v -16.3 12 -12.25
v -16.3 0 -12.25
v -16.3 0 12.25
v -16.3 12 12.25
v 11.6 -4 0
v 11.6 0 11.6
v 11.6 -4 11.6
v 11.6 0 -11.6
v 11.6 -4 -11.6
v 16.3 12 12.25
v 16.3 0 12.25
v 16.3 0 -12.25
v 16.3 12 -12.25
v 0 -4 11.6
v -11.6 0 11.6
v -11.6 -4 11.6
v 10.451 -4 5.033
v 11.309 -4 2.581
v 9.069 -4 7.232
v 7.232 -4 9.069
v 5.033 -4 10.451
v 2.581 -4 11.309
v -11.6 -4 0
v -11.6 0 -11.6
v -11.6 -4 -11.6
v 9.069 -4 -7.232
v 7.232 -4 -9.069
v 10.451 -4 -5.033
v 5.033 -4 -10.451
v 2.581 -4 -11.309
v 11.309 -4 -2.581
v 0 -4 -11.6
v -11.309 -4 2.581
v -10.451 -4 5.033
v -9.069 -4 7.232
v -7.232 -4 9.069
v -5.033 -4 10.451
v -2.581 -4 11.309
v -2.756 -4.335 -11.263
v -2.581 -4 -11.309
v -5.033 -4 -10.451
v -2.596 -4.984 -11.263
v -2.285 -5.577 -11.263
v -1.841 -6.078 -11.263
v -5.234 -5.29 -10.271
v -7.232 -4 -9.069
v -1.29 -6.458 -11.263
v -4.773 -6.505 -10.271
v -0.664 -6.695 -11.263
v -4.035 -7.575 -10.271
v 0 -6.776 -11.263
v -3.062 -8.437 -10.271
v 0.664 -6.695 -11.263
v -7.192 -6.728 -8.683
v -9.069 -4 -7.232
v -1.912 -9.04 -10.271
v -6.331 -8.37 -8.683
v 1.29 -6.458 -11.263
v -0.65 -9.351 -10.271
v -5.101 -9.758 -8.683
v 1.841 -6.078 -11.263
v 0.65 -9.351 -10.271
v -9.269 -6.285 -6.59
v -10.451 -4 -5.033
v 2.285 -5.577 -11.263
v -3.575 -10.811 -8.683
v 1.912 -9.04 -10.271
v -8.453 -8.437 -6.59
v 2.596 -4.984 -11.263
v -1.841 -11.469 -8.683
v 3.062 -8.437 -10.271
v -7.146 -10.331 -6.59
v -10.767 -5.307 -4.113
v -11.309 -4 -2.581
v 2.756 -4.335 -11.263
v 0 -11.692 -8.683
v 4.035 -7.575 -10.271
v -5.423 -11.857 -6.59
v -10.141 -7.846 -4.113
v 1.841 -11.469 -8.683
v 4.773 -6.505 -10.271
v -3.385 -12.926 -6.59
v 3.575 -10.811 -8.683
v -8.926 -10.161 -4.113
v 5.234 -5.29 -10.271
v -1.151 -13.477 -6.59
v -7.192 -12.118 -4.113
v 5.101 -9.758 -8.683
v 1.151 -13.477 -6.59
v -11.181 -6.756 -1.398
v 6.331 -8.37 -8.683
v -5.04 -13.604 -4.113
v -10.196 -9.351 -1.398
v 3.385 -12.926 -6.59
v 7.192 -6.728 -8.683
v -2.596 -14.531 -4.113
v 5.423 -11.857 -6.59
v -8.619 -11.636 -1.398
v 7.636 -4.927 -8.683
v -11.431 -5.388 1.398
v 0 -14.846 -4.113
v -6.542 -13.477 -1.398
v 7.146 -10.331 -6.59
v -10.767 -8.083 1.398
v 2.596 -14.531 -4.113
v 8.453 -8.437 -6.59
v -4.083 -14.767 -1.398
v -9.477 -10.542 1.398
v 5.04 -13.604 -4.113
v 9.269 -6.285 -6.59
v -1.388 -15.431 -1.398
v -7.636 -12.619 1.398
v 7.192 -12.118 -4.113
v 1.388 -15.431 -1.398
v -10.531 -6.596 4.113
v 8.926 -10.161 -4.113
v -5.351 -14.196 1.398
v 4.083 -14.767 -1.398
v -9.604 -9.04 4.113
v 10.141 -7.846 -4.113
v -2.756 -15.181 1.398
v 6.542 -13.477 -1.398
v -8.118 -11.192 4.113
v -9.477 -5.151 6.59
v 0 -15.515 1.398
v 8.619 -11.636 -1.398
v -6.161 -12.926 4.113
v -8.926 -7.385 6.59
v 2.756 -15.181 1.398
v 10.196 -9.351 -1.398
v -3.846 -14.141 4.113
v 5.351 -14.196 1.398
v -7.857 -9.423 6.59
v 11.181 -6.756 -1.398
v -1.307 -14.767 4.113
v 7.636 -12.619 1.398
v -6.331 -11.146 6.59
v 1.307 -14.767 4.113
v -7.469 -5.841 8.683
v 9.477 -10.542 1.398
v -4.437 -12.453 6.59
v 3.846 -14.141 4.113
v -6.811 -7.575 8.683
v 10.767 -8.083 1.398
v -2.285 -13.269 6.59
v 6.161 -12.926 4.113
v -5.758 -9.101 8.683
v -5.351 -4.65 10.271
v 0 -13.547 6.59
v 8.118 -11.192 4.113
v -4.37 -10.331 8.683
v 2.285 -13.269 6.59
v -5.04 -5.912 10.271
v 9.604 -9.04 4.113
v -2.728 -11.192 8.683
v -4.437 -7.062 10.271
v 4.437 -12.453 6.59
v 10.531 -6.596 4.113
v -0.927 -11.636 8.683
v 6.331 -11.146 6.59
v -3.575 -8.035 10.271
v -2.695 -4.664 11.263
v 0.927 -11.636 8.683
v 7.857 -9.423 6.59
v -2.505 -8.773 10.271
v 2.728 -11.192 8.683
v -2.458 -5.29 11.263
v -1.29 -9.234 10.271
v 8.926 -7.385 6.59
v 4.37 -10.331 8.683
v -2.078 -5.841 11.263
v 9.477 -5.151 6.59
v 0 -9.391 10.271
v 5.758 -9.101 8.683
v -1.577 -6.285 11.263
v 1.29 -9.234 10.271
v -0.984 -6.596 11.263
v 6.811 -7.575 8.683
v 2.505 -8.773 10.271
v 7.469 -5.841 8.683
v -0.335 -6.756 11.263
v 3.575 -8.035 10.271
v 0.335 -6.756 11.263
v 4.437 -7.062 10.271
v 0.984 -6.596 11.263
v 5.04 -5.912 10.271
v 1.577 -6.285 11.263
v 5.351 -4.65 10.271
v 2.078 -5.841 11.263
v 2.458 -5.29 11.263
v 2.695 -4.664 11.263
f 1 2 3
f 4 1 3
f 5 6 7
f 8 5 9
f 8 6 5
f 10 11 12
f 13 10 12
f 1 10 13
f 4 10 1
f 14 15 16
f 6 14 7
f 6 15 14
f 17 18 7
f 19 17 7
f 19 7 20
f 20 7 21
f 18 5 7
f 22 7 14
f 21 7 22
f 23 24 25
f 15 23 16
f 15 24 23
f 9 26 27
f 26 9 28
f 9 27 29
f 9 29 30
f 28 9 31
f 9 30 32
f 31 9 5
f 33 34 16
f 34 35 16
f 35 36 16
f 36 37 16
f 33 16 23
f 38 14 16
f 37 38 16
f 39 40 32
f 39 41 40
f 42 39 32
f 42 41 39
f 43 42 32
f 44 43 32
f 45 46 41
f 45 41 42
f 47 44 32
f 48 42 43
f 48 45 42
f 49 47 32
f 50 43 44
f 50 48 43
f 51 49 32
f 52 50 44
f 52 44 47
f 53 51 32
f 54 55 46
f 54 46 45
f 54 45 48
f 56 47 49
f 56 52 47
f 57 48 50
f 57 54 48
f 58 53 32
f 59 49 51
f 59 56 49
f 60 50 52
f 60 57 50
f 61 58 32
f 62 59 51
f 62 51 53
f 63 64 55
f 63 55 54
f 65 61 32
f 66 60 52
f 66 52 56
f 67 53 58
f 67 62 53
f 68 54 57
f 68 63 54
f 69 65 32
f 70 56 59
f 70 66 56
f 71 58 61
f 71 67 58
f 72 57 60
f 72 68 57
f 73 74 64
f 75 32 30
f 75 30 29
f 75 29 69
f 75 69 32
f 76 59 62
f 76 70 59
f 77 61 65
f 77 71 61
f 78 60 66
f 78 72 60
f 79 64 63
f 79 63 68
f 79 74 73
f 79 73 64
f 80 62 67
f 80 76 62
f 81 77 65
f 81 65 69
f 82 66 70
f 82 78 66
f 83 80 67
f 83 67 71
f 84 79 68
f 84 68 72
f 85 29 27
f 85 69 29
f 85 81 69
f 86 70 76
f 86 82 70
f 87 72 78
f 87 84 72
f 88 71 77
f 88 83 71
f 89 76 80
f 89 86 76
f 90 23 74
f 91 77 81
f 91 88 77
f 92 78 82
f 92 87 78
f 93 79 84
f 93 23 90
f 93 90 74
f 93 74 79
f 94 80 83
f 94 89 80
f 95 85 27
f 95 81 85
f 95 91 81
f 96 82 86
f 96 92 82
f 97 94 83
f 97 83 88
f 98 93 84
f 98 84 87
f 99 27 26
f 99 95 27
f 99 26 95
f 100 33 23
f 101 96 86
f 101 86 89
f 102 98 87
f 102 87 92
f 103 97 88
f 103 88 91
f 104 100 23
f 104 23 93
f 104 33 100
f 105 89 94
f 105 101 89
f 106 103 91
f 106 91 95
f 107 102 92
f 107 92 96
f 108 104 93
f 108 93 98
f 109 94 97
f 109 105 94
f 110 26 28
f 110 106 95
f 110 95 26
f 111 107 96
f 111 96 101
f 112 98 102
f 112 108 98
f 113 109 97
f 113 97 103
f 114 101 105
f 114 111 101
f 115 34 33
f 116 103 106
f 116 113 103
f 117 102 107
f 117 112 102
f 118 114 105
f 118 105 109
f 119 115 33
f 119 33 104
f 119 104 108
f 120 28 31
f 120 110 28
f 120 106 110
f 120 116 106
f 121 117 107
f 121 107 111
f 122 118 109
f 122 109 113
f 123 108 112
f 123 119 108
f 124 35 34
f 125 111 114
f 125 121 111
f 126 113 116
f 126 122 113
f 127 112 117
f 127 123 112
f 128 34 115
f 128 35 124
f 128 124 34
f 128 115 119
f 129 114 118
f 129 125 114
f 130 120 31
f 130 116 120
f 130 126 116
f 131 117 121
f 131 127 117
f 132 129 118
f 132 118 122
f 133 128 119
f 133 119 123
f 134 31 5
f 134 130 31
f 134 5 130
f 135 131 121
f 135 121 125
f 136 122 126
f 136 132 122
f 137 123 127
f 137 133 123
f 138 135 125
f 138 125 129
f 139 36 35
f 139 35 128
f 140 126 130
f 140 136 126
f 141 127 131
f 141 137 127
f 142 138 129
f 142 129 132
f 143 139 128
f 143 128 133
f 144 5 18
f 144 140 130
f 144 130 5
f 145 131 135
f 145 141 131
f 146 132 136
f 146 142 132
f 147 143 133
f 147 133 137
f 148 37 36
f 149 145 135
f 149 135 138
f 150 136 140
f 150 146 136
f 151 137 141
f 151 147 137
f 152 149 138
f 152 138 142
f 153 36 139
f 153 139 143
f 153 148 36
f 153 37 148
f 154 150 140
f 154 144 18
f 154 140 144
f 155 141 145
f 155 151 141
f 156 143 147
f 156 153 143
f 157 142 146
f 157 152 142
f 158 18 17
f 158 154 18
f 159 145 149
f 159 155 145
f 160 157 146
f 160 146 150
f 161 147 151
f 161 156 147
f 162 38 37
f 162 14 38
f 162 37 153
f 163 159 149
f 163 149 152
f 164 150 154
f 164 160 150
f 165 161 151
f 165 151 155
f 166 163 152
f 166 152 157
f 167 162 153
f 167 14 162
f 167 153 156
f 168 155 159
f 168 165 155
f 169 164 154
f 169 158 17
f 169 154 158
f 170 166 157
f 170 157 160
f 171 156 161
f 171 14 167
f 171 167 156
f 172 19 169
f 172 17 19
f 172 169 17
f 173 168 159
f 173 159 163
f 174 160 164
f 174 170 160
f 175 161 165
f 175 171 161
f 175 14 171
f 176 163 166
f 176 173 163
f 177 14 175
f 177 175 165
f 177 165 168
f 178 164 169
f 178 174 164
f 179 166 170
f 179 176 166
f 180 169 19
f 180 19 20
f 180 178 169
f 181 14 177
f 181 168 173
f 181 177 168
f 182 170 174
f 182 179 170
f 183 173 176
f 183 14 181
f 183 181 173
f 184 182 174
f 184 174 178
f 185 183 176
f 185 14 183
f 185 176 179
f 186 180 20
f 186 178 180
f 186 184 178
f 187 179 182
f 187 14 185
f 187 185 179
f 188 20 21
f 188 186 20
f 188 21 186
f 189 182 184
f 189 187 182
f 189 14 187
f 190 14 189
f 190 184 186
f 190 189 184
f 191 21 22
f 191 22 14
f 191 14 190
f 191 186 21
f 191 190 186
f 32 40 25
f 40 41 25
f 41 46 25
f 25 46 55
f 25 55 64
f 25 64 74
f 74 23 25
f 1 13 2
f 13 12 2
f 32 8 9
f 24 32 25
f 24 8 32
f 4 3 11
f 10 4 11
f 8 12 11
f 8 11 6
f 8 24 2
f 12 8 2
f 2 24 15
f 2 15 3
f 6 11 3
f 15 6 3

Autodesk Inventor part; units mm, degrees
ref_plane "YZ Plane" through (0, 0, 0) normal (1, 0, 0) x (0, 1, 0)
ref_plane "XZ Plane" through (0, 0, 0) normal (0, 1, 0) x (-1, 0, 0)
ref_plane "XY Plane" through (0, 0, 0) normal (0, 0, 1) x (1, 0, 0)
sketch "Sketch1" plane through (0, 0, 0) normal (0, 1, 0) x (-1, 0, 0)
  line L0 (16.3, 12.25) -> (-16.3, 12.25)
  line L1 (-16.3, 12.25) -> (-16.3, -12.25)
  line L2 (-16.3, -12.25) -> (16.3, -12.25)
  line L3 (16.3, -12.25) -> (16.3, 12.25)
  line L4 (11.6, 11.6) -> (-11.6, 11.6)
  line L5 (-11.6, 11.6) -> (-11.6, -11.6)
  line L6 (-11.6, -11.6) -> (11.6, -11.6)
  line L7 (11.6, -11.6) -> (11.6, 11.6)
  point P0 (0, 0)
  point P1 (-11.6, 0)
  point P2 (-16.3, 0)
  point P3 (0, 12.25)
  point P4 (0, 11.6)
  dimension "d0" = 32.6
  dimension "d1" = 24.5
  dimension "d2" = 23.2
extrude "Extrusion1" add sketch "Sketch1" along normal blind 12 contours L3 L2 L1 L0 | L7 L6 L5 L4
extrude "Extrusion2" add sketch "Sketch1" against normal blind 4 contours L7 L6 L5 L4
sketch "Sketch2" plane through (0, -4, 0) normal (0, -1, 0) x (1, 0, 0)
  line L0 (11.6, 11.6) -> (-11.6, 11.6) projected
  line L1 (0, 11.6) -> (0, -11.6)
  line L2 (11.6, -11.6) -> (-11.6, -11.6) projected
  arc A0 (0, -11.6) -> (0, 11.6) centre (0, 0) ccw
revolve "Revolution1" add sketch "Sketch2" angle 360 about axis through (0, -4, 11.6) along (0, 0, -1)
properties part number "pir"
